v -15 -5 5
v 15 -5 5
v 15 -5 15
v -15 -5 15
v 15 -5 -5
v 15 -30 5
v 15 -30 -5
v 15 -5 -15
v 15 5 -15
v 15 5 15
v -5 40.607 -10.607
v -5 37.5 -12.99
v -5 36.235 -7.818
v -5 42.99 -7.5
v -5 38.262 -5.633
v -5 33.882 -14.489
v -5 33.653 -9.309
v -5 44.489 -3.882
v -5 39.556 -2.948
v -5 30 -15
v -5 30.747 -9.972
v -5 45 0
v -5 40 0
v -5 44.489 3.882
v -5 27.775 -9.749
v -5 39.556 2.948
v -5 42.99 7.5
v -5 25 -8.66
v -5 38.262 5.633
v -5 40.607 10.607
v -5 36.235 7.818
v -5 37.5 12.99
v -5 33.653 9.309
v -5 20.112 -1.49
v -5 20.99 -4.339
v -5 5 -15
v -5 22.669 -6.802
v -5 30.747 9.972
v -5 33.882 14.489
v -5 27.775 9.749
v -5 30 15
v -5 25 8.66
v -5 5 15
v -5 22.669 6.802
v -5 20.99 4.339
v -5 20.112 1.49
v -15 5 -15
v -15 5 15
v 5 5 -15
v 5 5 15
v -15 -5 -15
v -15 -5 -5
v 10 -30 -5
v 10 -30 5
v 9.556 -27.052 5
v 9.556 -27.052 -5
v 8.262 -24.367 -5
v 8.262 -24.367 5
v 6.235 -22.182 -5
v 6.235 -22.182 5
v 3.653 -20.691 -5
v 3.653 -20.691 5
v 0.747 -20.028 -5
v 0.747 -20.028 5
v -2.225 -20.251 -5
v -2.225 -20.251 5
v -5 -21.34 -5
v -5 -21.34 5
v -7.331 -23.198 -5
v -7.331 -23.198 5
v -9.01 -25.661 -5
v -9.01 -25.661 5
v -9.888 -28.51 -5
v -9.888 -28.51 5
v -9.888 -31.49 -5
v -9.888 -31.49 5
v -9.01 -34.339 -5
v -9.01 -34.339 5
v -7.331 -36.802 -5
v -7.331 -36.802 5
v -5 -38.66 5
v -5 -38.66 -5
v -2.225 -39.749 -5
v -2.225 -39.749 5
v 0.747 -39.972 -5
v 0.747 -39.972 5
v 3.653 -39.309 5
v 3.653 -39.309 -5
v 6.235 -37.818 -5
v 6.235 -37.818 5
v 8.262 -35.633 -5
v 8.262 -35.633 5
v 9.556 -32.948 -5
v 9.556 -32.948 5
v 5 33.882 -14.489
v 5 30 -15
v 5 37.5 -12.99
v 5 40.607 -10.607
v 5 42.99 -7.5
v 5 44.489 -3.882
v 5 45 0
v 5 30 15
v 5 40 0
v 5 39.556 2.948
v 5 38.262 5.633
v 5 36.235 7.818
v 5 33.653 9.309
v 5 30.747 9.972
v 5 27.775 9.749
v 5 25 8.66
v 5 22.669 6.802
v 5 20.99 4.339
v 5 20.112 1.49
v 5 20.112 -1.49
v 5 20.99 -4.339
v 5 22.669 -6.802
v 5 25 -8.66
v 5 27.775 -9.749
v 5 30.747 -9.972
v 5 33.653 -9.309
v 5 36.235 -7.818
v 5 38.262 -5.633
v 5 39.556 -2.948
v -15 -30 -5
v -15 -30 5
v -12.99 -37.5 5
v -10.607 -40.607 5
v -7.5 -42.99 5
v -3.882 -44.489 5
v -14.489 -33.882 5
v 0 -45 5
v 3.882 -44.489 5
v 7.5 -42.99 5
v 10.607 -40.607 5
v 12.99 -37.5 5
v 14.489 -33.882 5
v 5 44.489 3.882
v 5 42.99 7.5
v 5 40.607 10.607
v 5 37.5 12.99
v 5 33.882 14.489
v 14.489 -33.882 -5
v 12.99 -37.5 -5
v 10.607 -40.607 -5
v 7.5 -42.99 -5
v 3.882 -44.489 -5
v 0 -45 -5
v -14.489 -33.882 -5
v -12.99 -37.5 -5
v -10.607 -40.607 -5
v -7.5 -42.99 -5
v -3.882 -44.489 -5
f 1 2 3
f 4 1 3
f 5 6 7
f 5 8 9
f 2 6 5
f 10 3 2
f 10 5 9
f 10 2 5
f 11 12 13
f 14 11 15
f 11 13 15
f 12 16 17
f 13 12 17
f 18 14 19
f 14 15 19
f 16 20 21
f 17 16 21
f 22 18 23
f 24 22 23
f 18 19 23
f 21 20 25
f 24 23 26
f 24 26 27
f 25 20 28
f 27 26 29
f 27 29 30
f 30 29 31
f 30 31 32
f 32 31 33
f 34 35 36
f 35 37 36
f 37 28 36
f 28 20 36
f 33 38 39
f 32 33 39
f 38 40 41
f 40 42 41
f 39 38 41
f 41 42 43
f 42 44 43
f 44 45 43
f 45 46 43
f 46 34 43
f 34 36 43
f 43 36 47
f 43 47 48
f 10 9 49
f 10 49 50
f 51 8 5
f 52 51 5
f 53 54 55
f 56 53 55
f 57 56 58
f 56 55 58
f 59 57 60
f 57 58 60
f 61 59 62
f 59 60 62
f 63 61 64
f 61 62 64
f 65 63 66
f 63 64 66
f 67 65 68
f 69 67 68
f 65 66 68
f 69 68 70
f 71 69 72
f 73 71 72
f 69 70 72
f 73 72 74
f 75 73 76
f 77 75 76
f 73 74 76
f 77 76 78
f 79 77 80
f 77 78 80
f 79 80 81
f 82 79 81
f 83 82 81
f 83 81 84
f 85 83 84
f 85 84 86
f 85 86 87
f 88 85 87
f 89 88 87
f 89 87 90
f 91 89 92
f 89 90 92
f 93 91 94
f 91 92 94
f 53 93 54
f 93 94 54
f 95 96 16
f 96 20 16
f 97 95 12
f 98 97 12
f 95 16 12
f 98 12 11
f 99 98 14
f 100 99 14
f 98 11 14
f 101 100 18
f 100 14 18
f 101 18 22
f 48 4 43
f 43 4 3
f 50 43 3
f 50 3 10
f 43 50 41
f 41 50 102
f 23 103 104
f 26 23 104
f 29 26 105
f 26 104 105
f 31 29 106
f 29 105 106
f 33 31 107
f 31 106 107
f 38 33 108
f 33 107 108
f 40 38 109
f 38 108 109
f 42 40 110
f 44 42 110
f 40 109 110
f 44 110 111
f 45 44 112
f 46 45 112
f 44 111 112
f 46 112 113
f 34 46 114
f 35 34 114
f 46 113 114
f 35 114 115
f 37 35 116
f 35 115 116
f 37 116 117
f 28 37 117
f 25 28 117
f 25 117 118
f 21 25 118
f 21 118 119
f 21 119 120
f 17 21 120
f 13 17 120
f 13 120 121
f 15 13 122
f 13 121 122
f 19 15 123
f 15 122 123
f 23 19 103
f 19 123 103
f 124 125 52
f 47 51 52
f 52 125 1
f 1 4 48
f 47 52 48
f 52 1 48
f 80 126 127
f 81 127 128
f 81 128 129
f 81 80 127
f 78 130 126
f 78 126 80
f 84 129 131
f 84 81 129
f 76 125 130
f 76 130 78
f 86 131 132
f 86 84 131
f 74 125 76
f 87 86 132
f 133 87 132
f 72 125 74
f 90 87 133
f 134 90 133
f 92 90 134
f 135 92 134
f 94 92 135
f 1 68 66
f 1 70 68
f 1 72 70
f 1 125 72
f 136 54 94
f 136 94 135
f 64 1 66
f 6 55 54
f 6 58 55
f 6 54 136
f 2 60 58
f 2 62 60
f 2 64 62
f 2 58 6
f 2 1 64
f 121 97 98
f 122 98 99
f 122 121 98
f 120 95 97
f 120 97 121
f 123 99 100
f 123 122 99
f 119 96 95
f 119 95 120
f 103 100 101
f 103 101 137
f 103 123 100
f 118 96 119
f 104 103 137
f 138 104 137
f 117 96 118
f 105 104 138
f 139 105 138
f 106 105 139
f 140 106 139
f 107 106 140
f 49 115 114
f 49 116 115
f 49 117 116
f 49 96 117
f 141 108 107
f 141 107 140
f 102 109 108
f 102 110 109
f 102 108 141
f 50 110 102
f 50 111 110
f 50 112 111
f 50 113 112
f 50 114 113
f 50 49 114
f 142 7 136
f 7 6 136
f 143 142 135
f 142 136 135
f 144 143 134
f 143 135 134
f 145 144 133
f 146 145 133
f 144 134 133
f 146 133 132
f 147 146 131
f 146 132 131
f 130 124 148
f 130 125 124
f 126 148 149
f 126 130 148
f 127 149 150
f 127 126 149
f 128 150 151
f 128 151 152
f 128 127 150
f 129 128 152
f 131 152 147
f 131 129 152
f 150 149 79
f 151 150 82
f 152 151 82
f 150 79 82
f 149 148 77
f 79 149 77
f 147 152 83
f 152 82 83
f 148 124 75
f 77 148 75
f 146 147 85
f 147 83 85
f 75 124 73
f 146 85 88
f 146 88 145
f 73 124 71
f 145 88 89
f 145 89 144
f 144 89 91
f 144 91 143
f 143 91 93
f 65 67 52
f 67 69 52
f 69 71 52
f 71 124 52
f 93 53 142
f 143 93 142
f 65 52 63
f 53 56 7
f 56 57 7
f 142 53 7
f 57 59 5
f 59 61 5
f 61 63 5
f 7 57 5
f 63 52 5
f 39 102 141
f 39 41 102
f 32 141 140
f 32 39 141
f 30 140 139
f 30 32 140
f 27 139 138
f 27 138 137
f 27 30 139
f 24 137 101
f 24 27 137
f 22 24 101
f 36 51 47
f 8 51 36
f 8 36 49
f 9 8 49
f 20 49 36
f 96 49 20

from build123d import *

# Parameters (mm, degrees)
F0_W      = 10
F0_H      = 30
F1_DEPTH  = 15
F2_W      = 30
F2_H      = 10
F3_DEPTH  = 40
F4_R      = 14.99999
F5_W      = 10
F5_H      = 30
F6_DEPTH  = 40
F7_R      = 14.99999
F8_R      = 10
F9_DEPTH  = 10
F10_R     = 10
F11_DEPTH = 10


# Not quite as in the source:
# - a fillet or chamfer is up to 0.001 mm smaller than in the source, because OpenCascade refuses the exact size


with BuildPart() as f1:
    # F0 (on Right) → F1 (new body, symmetric)
    with BuildSketch(Plane.YZ):
        Rectangle(F0_W, F0_H)
    extrude(amount=F1_DEPTH, both=True)

    # F2 (on face) → F3 (join)
    with BuildSketch(Plane.XZ.offset(5)):
        Rectangle(F2_W, F2_H)
    extrude(amount=F3_DEPTH)

    # F4 (radius 15 in the source; OpenCascade refuses exactly that, so slightly less here)
    f4_edges = [f1.edges().sort_by_distance(p)[0] for p in [
        (-15, -45, 0),
        (15, -45, 0),
    ]]
    fillet(f4_edges, radius=F4_R)

    # F5 (on face) → F6 (join)
    with BuildSketch(Plane(origin=(0, 5, 0), x_dir=(-1, 0, 0), z_dir=(0, 1, 0))):
        Rectangle(F5_W, F5_H)
    extrude(amount=F6_DEPTH)

    # F7 (radius 15 in the source; OpenCascade refuses exactly that, so slightly less here)
    f7_edges = [f1.edges().sort_by_distance(p)[0] for p in [
        (0, 45, 15),
        (0, 45, -15),
    ]]
    fillet(f7_edges, radius=F7_R)

    # F8 (on face) → F9 (cut, through all)
    with BuildSketch(Plane.XY.offset(5)):
        with Locations((0, -30)):
            Circle(F8_R)
    extrude(amount=-F9_DEPTH, mode=Mode.SUBTRACT)

    # F10 (on face) → F11 (cut, through all)
    with BuildSketch(Plane.YZ.offset(5)):
        with Locations((30, 0)):
            Circle(F10_R)
    extrude(amount=-F11_DEPTH, mode=Mode.SUBTRACT)


solid = f1.part
